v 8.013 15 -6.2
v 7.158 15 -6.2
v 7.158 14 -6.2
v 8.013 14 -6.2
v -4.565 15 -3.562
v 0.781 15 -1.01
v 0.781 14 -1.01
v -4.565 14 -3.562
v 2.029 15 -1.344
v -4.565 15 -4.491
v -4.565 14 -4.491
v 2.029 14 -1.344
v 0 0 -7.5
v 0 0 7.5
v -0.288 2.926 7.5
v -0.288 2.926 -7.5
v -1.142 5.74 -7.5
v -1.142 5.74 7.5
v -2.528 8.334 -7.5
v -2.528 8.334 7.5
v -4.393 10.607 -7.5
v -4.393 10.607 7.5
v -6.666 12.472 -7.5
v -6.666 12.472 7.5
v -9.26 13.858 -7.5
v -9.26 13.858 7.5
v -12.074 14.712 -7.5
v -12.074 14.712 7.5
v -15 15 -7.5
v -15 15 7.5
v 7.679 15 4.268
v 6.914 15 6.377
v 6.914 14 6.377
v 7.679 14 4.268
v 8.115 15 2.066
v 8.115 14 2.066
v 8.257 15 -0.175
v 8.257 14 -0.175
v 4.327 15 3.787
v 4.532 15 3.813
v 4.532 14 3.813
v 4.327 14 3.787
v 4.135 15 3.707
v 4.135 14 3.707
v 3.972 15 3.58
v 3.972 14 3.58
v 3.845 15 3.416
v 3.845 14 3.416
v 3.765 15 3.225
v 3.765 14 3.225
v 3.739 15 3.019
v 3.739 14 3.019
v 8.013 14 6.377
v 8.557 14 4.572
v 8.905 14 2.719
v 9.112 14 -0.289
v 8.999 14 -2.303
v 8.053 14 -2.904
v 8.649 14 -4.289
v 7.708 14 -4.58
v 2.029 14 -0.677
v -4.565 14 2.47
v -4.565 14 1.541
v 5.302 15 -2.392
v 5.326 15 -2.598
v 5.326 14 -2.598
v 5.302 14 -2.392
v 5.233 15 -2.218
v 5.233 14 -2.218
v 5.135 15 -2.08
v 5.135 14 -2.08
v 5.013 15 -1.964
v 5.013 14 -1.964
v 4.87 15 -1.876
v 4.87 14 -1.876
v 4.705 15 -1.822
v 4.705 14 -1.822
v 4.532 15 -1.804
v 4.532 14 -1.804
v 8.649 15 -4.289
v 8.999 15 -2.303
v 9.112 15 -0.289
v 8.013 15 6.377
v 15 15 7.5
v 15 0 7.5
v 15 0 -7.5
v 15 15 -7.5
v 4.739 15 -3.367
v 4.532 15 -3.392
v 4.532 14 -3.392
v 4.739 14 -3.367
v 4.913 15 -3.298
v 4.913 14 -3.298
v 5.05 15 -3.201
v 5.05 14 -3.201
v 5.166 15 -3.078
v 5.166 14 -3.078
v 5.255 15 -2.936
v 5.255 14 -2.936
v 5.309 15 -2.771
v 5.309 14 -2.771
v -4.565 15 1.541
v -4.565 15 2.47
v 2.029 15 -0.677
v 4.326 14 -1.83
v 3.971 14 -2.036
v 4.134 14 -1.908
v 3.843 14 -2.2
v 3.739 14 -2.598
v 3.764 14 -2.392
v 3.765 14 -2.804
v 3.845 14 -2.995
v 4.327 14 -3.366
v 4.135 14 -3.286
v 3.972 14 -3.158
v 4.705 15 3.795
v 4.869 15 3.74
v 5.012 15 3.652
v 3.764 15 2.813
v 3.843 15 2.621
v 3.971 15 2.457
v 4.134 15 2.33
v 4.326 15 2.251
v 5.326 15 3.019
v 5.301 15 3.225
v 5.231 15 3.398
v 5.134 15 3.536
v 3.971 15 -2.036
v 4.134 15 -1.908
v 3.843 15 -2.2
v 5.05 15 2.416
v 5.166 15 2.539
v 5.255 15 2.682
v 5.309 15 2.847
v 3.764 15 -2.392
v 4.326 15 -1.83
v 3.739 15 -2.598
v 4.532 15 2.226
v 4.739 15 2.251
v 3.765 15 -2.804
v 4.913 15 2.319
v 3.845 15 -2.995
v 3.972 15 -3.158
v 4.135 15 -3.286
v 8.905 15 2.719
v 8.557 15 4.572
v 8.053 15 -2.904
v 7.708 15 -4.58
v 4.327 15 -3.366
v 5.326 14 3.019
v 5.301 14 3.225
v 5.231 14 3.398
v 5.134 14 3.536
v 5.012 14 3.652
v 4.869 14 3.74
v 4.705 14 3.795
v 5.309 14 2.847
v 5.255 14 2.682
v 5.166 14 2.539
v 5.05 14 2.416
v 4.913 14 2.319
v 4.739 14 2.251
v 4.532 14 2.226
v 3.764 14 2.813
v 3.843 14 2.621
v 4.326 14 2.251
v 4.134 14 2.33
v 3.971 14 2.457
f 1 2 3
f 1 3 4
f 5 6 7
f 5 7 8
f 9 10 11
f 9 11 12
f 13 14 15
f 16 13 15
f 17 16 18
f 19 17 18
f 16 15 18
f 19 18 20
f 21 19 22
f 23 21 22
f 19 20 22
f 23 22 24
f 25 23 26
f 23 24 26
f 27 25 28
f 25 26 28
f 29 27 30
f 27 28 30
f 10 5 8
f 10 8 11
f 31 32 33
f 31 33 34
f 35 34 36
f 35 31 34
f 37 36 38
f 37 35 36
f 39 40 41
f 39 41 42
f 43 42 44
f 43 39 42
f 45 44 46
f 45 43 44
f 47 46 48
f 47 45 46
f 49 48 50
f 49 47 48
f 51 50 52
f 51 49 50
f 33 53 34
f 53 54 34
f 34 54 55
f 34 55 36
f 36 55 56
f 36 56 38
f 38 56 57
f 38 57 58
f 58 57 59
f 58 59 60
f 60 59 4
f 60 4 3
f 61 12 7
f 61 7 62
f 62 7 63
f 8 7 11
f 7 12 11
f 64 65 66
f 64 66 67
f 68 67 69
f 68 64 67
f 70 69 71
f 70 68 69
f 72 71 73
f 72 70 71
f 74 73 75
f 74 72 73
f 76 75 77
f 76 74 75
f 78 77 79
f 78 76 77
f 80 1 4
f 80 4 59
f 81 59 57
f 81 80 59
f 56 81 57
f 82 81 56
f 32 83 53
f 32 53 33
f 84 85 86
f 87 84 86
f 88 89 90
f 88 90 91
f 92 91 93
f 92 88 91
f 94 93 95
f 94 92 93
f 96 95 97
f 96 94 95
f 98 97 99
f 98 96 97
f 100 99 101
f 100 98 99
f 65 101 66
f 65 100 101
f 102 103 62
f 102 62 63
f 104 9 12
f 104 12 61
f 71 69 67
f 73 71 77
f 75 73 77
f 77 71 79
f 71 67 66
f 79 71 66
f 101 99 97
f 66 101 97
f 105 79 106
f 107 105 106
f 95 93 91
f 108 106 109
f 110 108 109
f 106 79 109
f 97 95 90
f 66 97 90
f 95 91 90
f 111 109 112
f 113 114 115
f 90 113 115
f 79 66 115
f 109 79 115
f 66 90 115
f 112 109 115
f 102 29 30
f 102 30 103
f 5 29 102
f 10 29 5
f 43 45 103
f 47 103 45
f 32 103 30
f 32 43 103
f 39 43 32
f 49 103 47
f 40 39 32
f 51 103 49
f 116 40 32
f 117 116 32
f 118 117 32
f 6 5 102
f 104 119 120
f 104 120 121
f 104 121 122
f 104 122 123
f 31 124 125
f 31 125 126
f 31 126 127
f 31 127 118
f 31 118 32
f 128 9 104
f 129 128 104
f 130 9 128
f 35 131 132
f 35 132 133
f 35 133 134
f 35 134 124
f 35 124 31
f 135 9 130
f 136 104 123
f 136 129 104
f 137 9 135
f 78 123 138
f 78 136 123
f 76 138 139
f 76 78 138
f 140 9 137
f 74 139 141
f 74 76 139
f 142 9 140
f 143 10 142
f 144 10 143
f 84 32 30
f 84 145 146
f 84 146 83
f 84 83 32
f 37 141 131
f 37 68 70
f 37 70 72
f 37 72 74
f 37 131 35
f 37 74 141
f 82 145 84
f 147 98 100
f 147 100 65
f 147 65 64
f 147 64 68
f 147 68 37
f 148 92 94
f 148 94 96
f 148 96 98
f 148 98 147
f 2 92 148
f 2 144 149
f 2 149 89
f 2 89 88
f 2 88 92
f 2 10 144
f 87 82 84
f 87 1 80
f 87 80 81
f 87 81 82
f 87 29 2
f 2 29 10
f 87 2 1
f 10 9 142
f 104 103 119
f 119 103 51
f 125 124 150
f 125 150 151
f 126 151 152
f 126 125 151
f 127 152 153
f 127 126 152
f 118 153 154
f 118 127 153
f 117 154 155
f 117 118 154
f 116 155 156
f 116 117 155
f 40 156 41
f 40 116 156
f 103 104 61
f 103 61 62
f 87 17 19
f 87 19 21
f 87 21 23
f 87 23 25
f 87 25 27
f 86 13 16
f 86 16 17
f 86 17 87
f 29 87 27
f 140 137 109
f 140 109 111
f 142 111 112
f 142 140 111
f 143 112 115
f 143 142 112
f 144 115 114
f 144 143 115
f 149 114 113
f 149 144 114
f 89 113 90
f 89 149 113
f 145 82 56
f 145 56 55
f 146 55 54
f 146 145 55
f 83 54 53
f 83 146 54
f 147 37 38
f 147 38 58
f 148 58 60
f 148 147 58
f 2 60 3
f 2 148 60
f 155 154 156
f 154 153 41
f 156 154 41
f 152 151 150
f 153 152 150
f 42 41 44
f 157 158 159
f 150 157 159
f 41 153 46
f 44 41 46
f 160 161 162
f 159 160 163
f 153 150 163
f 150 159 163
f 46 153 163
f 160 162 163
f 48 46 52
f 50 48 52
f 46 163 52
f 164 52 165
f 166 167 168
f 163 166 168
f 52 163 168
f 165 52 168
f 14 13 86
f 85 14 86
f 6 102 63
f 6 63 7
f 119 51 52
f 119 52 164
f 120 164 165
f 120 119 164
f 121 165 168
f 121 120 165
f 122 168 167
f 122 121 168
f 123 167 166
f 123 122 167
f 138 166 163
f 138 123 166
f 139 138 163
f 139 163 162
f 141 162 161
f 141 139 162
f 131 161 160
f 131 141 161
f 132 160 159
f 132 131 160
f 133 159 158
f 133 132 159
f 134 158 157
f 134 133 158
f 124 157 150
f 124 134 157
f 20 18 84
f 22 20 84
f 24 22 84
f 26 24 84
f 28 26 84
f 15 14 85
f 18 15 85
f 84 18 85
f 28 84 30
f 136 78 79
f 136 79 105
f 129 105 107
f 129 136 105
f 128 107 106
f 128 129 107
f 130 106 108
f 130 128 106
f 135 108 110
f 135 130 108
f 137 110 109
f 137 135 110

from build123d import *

# Parameters (mm, degrees)
SKETCH1_W           = 30
SKETCH1_H           = 15
BOSS_EXTRUDE1_DEPTH = 15
SKETCH2_R           = 15
CUT_EXTRUDE1_DEPTH  = 15
CUT_EXTRUDE2_DEPTH  = 1


with BuildPart() as part:
    # Sketch1 → Boss-Extrude1 (new body)
    with BuildSketch(Plane(origin=(0, 0, 0), x_dir=(1, 0, 0), z_dir=(0, 1, 0))):
        Rectangle(SKETCH1_W, SKETCH1_H)
    extrude(amount=BOSS_EXTRUDE1_DEPTH)

    # Sketch2 → Cut-Extrude1 (cut)
    with BuildSketch(Plane.XY.offset(7.5)):
        with Locations((-15, 0)):
            Circle(SKETCH2_R)
    extrude(amount=-CUT_EXTRUDE1_DEPTH, mode=Mode.SUBTRACT)

    # Sketch3 → Cut-Extrude2 (cut)
    with BuildSketch(Plane(origin=(0, 15, 0), x_dir=(1, 0, 0), z_dir=(0, 1, 0))):
        Polygon((-4.565210898, -1.540580661), (0.781153285, 1.010486046), (-4.565210898, 3.561552753), (-4.565210898, 4.490774507), (2.029019871, 1.344395301), (2.029019871, 0.676576791), (-4.565210898, -2.469802416), align=None)
        with BuildLine():
            add(Edge.make_bspline(
                [(4.532385256, 3.391736046), (4.585426476, 3.388584178), (4.689407588, 3.382405309), (4.83973693, 3.340014504), (4.975793825, 3.264743436), (5.096985148, 3.164424017), (5.196879202, 3.042787963), (5.274832761, 2.90781624), (5.316854299, 2.756228334), (5.322988159, 2.651644719), (5.326135256, 2.597986046)],
                knots=[0, 0, 0, 0, 0.000159102, 0.000311902, 0.000463876, 0.000622429, 0.000780981, 0.000933875, 0.001086674, 0.001247676, 0.001247676, 0.001247676, 0.001247676], degree=3))
            add(Edge.make_bspline(
                [(5.326135256, 2.597986046), (5.322988159, 2.544327373), (5.316854299, 2.439743758), (5.274832761, 2.288155852), (5.196879202, 2.153184129), (5.096985148, 2.031548075), (4.975793825, 1.931228656), (4.83973693, 1.855957587), (4.689407588, 1.813566782), (4.585426476, 1.807387914), (4.532385256, 1.804236046)],
                knots=[0, 0, 0, 0, 0.000161002, 0.000313801, 0.000466695, 0.000625248, 0.0007838, 0.000935775, 0.001088574, 0.001247676, 0.001247676, 0.001247676, 0.001247676], degree=3))
            add(Edge.make_bspline(
                [(4.532385256, 1.804236046), (4.479307324, 1.807283761), (4.375865992, 1.813223325), (4.226079814, 1.856876161), (4.089202284, 1.930531062), (3.968032593, 2.03173365), (3.867325054, 2.152555772), (3.792822649, 2.289085596), (3.747168888, 2.439306024), (3.741525683, 2.54423952), (3.738635256, 2.597986046)],
                knots=[0, 0, 0, 0, 0.000159102, 0.000310068, 0.000463722, 0.000622275, 0.000780827, 0.000932802, 0.001086136, 0.001247138, 0.001247138, 0.001247138, 0.001247138], degree=3))
            add(Edge.make_bspline(
                [(3.738635256, 2.597986046), (3.741631063, 2.650449237), (3.747548948, 2.754084477), (3.792844046, 2.903037506), (3.867230597, 3.039722332), (3.96867028, 3.160258542), (4.088470126, 3.2638968), (4.226513734, 3.336529736), (4.375479803, 3.383381479), (4.479237718, 3.388906159), (4.532385256, 3.391736046)],
                knots=[0, 0, 0, 0, 0.000157203, 0.000310538, 0.000462512, 0.000621065, 0.000780841, 0.000934495, 0.001086002, 0.001245105, 0.001245105, 0.001245105, 0.001245105], degree=3))
        make_face()
        with BuildLine():
            add(Edge.make_bspline(
                [(4.532385256, -2.225571646), (4.585426476, -2.228723514), (4.689407588, -2.234902383), (4.83973693, -2.277293188), (4.975793825, -2.352564257), (5.096985148, -2.452883675), (5.196879202, -2.57451973), (5.274832761, -2.709491453), (5.316854299, -2.861079358), (5.322988159, -2.965662974), (5.326135256, -3.019321646)],
                knots=[0, 0, 0, 0, 0.000159102, 0.000311902, 0.000463876, 0.000622429, 0.000780981, 0.000933875, 0.001086674, 0.001247676, 0.001247676, 0.001247676, 0.001247676], degree=3))
            add(Edge.make_bspline(
                [(5.326135256, -3.019321646), (5.322881514, -3.071690994), (5.316465182, -3.174962578), (5.274929085, -3.32540713), (5.196285105, -3.460463205), (5.09767416, -3.583749738), (4.975763866, -3.684281679), (4.839415269, -3.758912353), (4.689760488, -3.804338384), (4.585485351, -3.81012495), (4.532385256, -3.813071646)],
                knots=[0, 0, 0, 0, 0.000157203, 0.000310002, 0.000462897, 0.000622923, 0.000781475, 0.00093345, 0.001086785, 0.001245887, 0.001245887, 0.001245887, 0.001245887], degree=3))
            add(Edge.make_bspline(
                [(4.532385256, -3.813071646), (4.479246898, -3.810231571), (4.375506905, -3.804687001), (4.226410735, -3.757979649), (4.08923177, -3.684981518), (3.967345212, -3.583562286), (3.867908372, -3.46109761), (3.792727865, -3.324477007), (3.74757896, -3.175393238), (3.741641149, -3.071775817), (3.738635256, -3.019321646)],
                knots=[0, 0, 0, 0, 0.000159102, 0.000310609, 0.000464264, 0.000622816, 0.000782843, 0.000934817, 0.001088152, 0.001245355, 0.001245355, 0.001245355, 0.001245355], degree=3))
            add(Edge.make_bspline(
                [(3.738635256, -3.019321646), (3.741525683, -2.96557512), (3.747168888, -2.860641624), (3.792822649, -2.710421196), (3.867325054, -2.573891372), (3.968032593, -2.453069251), (4.089202284, -2.351866663), (4.226079814, -2.278211761), (4.375865992, -2.234558925), (4.479307324, -2.228619362), (4.532385256, -2.225571646)],
                knots=[0, 0, 0, 0, 0.000161002, 0.000314336, 0.000466311, 0.000624863, 0.000783415, 0.00093707, 0.001088035, 0.001247138, 0.001247138, 0.001247138, 0.001247138], degree=3))
        make_face()
        with BuildLine():
            Line((8.012673717, -6.377494723), (6.913635256, -6.377494723))
            add(Edge.make_bspline(
                [(6.913635256, -6.377494723), (6.964923037, -6.268556916), (7.068946293, -6.047606327), (7.207381282, -5.703499581), (7.344635711, -5.34898027), (7.470061478, -4.979429934), (7.587529774, -4.596798161), (7.699577806, -4.200923285), (7.798655827, -3.790991301), (7.927768443, -3.226973351), (8.061537871, -2.505405036), (8.172348909, -1.623616401), (8.244020266, -0.728938898), (8.252595321, -0.127485519), (8.256904487, 0.174758882)],
                knots=[0, 0, 0, 0, 0.000361147, 0.000732487, 0.001112362, 0.001501554, 0.001902903, 0.002313081, 0.002735593, 0.00316793, 0.004048889, 0.004935676, 0.005833185, 0.006739799, 0.006739799, 0.006739799, 0.006739799], degree=3))
            add(Edge.make_bspline(
                [(8.256904487, 0.174758882), (8.252902226, 0.454678656), (8.244972319, 1.009299641), (8.191798742, 1.834123368), (8.097085547, 2.6424037), (7.970871979, 3.430798715), (7.811358038, 4.187699516), (7.62592252, 4.903463701), (7.412126188, 5.57256258), (7.24119411, 5.994633525), (7.157866025, 6.200389892)],
                knots=[0, 0, 0, 0, 0.00083976, 0.001663864, 0.002478263, 0.003280358, 0.00405836, 0.004797909, 0.005497855, 0.006163637, 0.006163637, 0.006163637, 0.006163637], degree=3))
            Line((7.157866025, 6.200389892), (8.012673717, 6.200389892))
            add(Edge.make_bspline(
                [(8.012673717, 6.200389892), (8.054744003, 6.10338045), (8.139913324, 5.90698938), (8.256148684, 5.601782231), (8.365580554, 5.284503822), (8.472030365, 4.95493584), (8.568429545, 4.612298427), (8.65782742, 4.256424857), (8.742333903, 3.88830928), (8.843284081, 3.378212649), (8.953267541, 2.726122679), (9.043476277, 1.92739898), (9.100527601, 1.113721058), (9.107966351, 0.565368415), (9.111712179, 0.289242056)],
                knots=[0, 0, 0, 0, 0.000317185, 0.000642126, 0.000979441, 0.001323997, 0.001680966, 0.002047019, 0.002424721, 0.002813889, 0.003606878, 0.00440779, 0.005224405, 0.00605272, 0.00605272, 0.00605272, 0.00605272], degree=3))
            add(Edge.make_bspline(
                [(9.111712179, 0.289242056), (9.108657505, -0.008500857), (9.10258886, -0.600019428), (9.046302547, -1.482164848), (8.960344753, -2.353183983), (8.835781357, -3.209818768), (8.680204435, -4.045048948), (8.494446198, -4.852986274), (8.274075254, -5.629424741), (8.099072178, -6.130242561), (8.012673717, -6.377494723)],
                knots=[0, 0, 0, 0, 0.000893134, 0.001774367, 0.002650754, 0.003518288, 0.004370411, 0.005198895, 0.006004563, 0.006790171, 0.006790171, 0.006790171, 0.006790171], degree=3))
        make_face()
    extrude(amount=-CUT_EXTRUDE2_DEPTH, mode=Mode.SUBTRACT)


solid = part.part
